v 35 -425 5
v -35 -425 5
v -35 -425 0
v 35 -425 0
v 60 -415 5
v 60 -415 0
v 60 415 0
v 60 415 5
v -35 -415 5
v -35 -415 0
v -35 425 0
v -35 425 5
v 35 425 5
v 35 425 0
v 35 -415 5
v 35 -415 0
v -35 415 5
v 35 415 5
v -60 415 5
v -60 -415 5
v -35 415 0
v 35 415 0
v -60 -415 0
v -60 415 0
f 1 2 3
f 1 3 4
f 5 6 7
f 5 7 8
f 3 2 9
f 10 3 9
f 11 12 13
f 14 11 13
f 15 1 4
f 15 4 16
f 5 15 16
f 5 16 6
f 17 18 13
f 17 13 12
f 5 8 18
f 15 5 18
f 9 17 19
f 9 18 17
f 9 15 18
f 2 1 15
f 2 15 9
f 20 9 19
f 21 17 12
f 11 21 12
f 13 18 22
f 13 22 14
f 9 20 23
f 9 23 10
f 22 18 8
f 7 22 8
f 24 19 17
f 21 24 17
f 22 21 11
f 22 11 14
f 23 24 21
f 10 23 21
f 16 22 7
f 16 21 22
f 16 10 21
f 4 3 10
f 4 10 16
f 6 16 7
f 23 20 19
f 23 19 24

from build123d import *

# Parameters (mm, degrees)
F1_DEPTH = 425
F2_W     = 25
F2_H     = 10
F3_DEPTH = 5.001


with BuildPart() as f1:
    # F0 (on Front) → F1 (new body, symmetric)
    with BuildSketch(Plane.XZ):
        Polygon((-60, 5), (-60, 0), (0, 0), (60, 0), (60, 5), (0, 5), align=None)
    extrude(amount=F1_DEPTH, both=True)

    # F2 (on face) → F3 (cut, through all)
    with BuildSketch(Plane.XY.offset(5)):
        with Locations((47.5, -420)):
            Rectangle(F2_W, F2_H)
        with Locations((-47.5, -420)):
            Rectangle(F2_W, F2_H)
        with Locations((-47.5, 420)):
            Rectangle(F2_W, F2_H)
        with Locations((47.5, 420)):
            Rectangle(F2_W, F2_H)
    extrude(amount=-F3_DEPTH, mode=Mode.SUBTRACT)


solid = f1.part
